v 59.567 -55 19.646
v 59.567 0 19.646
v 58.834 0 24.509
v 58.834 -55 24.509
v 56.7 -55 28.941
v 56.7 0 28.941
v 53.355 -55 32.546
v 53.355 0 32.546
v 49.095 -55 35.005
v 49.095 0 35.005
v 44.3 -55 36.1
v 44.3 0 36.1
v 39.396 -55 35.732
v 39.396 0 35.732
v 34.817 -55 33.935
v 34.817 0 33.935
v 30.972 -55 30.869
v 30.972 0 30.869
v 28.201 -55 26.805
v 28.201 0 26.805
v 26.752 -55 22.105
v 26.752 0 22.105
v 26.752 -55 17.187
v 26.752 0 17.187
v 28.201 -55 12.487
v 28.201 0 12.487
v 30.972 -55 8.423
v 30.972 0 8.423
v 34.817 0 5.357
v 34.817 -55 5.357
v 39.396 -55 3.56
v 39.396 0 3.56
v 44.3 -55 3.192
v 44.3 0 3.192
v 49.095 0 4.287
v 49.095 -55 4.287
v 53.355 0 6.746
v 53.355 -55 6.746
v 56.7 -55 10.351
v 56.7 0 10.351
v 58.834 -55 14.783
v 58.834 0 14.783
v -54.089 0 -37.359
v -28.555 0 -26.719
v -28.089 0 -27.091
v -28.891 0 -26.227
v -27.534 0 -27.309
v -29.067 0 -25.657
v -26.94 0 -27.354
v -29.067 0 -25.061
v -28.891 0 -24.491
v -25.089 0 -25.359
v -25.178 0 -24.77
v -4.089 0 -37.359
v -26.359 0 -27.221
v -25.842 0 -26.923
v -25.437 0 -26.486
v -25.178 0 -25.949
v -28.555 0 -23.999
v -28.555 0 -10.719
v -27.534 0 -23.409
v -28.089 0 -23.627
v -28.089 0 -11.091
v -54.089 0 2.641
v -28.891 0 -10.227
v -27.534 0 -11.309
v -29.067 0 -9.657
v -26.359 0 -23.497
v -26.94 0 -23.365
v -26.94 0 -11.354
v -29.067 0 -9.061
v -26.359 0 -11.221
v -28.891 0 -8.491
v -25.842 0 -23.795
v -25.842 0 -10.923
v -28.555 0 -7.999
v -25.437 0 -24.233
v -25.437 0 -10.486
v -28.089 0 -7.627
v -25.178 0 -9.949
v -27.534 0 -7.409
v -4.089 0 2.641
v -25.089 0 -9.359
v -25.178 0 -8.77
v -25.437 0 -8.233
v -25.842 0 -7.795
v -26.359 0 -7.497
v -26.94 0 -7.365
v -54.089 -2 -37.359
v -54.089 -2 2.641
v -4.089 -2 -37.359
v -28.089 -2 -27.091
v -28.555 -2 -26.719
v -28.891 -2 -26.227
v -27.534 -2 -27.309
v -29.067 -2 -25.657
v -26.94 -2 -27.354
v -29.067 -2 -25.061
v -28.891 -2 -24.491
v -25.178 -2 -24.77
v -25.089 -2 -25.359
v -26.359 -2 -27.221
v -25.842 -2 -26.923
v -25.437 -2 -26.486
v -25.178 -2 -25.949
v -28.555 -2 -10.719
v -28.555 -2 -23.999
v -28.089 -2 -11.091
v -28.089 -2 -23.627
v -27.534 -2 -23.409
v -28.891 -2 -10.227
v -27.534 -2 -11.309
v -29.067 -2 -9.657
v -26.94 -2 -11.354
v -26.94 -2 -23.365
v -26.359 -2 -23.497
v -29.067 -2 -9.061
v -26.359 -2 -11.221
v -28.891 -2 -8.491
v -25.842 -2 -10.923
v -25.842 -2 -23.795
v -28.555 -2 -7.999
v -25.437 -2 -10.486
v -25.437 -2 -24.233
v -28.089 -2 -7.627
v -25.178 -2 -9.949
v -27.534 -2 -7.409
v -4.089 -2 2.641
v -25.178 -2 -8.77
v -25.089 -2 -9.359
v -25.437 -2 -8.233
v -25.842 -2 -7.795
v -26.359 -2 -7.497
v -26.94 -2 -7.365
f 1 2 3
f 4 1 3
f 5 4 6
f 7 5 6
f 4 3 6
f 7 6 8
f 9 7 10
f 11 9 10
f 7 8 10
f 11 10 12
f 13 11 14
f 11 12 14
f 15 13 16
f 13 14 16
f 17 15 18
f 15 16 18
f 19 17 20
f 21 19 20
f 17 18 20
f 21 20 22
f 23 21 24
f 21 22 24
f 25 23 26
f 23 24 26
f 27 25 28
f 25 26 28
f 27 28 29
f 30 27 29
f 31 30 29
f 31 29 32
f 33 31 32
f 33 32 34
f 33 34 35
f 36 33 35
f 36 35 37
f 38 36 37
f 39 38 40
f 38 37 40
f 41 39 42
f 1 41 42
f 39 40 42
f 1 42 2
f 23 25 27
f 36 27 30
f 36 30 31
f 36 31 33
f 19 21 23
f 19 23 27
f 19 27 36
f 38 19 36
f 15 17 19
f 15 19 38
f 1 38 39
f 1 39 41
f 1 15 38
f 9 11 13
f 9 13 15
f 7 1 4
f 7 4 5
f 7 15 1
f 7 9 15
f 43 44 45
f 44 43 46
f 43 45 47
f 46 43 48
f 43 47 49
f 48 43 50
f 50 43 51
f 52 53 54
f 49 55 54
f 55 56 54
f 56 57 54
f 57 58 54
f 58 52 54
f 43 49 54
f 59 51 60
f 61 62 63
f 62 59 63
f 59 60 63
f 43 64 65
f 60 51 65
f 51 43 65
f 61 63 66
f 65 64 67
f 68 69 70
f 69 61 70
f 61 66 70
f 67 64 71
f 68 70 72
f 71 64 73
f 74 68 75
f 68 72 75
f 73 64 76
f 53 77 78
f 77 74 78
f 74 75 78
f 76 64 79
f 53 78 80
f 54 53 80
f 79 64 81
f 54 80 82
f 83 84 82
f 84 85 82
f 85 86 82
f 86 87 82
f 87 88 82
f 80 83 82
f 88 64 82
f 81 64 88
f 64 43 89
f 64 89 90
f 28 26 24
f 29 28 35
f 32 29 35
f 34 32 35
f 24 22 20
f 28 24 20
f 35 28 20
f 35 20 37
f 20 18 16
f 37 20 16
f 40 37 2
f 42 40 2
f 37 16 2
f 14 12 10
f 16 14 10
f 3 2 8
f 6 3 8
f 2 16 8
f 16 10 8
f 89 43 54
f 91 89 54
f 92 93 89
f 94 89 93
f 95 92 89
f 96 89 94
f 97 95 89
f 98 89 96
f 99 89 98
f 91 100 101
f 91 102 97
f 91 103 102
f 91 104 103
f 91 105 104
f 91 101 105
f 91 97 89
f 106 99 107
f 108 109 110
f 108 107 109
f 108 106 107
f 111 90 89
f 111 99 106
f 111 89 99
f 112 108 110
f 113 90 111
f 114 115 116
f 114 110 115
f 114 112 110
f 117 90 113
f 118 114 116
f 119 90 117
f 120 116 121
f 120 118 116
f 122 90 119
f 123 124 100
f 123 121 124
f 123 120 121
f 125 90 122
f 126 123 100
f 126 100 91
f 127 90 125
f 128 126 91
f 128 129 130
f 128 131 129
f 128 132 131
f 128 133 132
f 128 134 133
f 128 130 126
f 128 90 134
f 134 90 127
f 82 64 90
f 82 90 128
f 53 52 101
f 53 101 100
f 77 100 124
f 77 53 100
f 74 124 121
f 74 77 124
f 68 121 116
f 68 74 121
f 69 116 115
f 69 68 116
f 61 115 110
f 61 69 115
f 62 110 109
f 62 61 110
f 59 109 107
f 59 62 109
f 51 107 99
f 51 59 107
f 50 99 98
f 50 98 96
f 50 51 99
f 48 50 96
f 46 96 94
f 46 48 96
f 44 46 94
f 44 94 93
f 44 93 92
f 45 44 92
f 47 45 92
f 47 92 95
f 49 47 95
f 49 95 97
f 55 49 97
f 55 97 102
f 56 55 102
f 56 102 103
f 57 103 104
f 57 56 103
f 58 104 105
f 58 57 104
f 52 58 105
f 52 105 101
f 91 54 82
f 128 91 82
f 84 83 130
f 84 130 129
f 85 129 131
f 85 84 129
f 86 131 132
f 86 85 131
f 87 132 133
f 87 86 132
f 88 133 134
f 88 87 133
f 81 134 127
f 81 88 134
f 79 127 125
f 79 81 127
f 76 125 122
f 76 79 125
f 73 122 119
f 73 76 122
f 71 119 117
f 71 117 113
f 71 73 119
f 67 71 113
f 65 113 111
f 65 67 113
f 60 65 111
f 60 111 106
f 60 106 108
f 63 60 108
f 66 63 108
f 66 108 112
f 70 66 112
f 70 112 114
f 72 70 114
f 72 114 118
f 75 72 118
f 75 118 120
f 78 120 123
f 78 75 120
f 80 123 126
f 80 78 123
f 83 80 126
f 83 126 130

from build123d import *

# Parameters (mm, degrees)
F0_W     = 50
F0_H     = 40
F0_R     = 2
F1_DEPTH = 2
F2_R     = 16.5
F3_DEPTH = 55


with BuildPart() as f1:
    # F0 (on Front) → F1 (new body)
    with BuildSketch(Plane.XZ):
        with Locations((-29.089227, -17.359149)):
            Rectangle(F0_W, F0_H)
        with Locations((-27.089227, -25.359149)):
            Circle(F0_R, mode=Mode.SUBTRACT)
        with Locations((-27.089227, -9.359149)):
            Circle(F0_R, mode=Mode.SUBTRACT)
    extrude(amount=F1_DEPTH)


with BuildPart() as f3:
    # F2 (on Front) → F3 (new body)
    with BuildSketch(Plane.XZ):
        with Locations((43.06734, 19.64603)):
            Circle(F2_R)
    extrude(amount=F3_DEPTH)


solid = Compound([f1.part, f3.part])
